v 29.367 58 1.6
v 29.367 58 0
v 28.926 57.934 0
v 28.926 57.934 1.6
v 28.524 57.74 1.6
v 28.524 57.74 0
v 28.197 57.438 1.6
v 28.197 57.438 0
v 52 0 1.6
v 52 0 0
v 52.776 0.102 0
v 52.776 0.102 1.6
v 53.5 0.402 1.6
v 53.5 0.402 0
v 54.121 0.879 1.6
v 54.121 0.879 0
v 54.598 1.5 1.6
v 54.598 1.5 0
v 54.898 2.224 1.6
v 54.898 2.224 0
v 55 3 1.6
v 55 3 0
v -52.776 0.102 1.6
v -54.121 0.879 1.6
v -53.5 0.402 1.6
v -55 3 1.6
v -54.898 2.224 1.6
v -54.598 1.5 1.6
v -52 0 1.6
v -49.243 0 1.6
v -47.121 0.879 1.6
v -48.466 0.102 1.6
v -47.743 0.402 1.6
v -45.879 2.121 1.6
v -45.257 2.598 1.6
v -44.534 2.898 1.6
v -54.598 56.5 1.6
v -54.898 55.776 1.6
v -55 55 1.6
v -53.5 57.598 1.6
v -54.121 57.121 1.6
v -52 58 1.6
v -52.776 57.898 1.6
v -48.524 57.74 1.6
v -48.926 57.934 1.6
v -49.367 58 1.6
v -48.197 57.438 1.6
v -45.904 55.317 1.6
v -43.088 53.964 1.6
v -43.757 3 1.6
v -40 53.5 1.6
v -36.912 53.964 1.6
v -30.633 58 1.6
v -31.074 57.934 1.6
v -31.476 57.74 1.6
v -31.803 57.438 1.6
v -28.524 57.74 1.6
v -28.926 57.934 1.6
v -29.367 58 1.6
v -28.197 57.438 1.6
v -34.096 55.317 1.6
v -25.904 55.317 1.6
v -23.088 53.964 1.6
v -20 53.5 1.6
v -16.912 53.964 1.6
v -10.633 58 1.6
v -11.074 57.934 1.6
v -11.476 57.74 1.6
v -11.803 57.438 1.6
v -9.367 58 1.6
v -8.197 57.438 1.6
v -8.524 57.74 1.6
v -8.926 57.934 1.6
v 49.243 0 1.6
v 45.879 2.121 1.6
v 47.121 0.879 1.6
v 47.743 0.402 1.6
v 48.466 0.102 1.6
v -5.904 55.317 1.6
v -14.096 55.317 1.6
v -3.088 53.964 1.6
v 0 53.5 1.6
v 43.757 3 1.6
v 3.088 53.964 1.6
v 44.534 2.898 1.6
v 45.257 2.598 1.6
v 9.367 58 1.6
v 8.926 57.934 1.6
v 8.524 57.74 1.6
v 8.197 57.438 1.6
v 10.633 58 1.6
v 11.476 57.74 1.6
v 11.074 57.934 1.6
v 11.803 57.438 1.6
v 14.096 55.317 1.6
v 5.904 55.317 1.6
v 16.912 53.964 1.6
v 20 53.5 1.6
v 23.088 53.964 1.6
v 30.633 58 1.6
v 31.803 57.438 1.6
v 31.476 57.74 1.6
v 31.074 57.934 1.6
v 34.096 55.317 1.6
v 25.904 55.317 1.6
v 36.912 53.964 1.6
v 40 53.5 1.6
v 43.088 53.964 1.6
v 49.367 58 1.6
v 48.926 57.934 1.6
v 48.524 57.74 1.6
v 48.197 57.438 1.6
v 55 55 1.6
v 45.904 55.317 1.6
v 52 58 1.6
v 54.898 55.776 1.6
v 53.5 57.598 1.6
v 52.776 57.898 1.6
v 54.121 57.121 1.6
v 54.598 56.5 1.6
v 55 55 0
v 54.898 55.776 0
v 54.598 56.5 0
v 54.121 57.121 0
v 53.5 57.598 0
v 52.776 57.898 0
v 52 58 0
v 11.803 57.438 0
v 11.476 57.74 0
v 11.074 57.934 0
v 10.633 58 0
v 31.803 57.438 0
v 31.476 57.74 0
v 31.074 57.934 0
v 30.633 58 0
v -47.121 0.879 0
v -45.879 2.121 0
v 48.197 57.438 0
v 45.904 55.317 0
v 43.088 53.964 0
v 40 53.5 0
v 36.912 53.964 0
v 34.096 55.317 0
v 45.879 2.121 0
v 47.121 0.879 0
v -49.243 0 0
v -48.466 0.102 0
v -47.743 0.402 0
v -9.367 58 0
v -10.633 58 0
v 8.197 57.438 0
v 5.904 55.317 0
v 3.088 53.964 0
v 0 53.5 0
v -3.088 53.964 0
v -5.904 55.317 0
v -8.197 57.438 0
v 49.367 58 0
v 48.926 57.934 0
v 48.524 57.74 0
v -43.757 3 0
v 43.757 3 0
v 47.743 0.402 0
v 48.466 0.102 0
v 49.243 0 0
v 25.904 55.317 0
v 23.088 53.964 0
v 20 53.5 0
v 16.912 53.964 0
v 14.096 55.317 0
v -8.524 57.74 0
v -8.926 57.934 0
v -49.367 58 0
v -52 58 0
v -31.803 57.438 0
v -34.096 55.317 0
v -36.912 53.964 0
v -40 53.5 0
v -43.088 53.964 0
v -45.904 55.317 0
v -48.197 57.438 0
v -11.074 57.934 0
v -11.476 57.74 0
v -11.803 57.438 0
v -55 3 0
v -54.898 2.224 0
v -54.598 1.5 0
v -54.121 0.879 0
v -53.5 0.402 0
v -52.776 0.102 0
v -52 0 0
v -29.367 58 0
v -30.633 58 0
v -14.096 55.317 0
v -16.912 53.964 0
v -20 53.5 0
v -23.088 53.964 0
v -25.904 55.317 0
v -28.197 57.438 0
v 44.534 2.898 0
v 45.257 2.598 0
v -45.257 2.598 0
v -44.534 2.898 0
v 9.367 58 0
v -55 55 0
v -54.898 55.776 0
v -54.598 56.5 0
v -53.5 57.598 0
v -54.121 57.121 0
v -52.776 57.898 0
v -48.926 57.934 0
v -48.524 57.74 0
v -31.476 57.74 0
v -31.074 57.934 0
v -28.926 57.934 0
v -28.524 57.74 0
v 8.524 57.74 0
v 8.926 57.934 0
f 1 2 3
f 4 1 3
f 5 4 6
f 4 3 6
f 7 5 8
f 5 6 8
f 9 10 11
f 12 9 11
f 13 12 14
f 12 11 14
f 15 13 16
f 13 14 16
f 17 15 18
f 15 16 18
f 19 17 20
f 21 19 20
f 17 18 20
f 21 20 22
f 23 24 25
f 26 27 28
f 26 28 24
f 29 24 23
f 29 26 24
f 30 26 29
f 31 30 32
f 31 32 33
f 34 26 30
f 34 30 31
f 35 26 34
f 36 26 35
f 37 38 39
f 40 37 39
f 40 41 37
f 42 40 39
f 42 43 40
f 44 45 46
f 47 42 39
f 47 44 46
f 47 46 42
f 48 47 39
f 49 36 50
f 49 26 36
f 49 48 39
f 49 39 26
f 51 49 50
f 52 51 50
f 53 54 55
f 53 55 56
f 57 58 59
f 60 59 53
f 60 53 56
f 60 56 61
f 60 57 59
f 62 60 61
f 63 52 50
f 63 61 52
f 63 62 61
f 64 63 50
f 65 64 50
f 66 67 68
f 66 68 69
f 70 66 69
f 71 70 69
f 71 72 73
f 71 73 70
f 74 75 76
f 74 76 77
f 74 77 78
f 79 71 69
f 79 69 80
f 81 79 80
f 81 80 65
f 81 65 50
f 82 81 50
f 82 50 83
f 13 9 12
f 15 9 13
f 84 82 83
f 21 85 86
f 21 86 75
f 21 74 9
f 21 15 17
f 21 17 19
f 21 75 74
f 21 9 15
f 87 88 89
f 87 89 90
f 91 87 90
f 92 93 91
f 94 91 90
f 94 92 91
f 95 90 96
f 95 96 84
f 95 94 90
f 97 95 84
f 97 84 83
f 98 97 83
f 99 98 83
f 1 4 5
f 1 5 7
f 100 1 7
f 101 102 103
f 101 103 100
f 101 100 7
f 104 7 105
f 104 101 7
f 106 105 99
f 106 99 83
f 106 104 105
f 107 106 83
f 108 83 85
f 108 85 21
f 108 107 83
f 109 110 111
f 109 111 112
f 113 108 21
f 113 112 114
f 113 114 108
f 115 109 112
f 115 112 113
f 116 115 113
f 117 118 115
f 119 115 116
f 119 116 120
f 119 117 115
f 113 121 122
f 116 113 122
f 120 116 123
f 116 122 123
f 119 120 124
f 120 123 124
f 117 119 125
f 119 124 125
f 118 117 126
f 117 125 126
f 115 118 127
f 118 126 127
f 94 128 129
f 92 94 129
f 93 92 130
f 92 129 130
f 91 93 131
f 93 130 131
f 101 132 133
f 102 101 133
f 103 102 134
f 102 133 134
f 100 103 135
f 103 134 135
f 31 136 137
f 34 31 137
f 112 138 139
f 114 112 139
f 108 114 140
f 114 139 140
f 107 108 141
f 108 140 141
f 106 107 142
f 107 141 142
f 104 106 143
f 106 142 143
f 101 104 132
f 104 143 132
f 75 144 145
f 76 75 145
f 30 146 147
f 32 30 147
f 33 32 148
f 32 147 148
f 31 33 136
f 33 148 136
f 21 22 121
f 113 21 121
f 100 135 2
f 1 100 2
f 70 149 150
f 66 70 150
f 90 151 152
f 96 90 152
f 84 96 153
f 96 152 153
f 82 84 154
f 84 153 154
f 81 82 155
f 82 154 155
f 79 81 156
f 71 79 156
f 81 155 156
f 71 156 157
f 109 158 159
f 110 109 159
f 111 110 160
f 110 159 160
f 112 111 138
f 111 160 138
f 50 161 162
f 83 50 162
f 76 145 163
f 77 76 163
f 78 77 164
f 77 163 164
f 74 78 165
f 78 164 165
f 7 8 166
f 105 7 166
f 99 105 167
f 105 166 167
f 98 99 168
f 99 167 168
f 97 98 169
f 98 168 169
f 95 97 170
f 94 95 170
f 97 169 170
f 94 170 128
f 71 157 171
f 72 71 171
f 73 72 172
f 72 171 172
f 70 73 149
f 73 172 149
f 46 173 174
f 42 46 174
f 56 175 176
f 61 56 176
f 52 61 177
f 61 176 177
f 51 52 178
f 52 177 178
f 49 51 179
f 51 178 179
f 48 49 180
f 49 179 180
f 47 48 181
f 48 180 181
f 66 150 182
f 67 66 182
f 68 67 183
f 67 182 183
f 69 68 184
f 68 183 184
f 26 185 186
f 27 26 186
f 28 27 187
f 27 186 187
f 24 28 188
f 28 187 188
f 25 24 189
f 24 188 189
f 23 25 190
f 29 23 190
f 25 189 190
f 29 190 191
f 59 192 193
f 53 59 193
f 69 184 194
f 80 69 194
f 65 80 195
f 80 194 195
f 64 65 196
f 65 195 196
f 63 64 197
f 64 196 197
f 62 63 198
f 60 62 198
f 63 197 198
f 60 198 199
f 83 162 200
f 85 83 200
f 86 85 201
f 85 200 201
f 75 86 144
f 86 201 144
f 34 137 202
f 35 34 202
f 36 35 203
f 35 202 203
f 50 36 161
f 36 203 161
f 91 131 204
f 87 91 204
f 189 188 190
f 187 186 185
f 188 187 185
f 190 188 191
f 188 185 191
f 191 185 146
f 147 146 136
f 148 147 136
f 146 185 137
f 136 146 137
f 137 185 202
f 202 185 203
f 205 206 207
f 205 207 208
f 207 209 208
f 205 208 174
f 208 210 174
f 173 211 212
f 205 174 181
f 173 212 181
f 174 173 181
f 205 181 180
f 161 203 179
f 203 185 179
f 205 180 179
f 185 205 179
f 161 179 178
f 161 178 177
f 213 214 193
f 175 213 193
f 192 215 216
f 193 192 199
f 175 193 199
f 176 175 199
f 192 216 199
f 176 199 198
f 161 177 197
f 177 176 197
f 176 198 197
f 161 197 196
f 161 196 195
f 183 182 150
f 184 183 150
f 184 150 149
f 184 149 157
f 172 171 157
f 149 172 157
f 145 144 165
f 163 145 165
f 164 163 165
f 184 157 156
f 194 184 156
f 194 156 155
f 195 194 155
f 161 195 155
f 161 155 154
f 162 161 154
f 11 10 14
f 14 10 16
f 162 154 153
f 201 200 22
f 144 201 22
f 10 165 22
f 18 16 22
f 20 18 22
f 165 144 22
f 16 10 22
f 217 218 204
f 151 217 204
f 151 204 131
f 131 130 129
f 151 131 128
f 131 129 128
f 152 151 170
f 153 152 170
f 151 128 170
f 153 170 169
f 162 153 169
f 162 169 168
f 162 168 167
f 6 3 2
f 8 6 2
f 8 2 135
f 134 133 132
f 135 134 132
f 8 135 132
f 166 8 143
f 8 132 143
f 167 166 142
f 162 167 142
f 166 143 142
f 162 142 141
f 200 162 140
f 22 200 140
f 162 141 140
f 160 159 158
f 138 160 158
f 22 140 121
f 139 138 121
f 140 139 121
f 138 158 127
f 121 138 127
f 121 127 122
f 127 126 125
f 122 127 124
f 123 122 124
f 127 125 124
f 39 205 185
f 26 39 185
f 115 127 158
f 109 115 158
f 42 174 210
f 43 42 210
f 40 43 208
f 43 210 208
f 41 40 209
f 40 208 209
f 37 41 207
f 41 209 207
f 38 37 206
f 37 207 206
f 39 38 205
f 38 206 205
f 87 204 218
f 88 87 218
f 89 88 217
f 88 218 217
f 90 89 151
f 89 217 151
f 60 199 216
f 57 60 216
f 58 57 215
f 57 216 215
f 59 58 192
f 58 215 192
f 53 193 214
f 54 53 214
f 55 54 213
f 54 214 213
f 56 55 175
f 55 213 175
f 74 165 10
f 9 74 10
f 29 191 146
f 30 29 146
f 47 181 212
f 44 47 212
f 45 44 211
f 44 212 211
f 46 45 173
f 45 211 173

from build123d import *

# Parameters (mm, degrees)
BOSS_EXTRUDE1_DEPTH = 1.6


with BuildPart() as part:
    # Sketch2 → Boss-Extrude1 (new body)
    with BuildSketch(Plane.XY):
        with BuildLine():
            Line((-47.121320344, 0.878679656), (-45.878679656, 2.121320344))
            ThreePointArc((-45.878679656, 2.121320344), (-44.90540961, 2.771638598), (-43.757359313, 3))
            Line((-43.757359313, 3), (43.757359313, 3))
            ThreePointArc((43.757359313, 3), (44.90540961, 2.771638598), (45.878679656, 2.121320344))
            Line((45.878679656, 2.121320344), (47.121320344, 0.878679656))
            ThreePointArc((47.121320344, 0.878679656), (48.09459039, 0.228361402), (49.242640687, 0))
            Line((49.242640687, 0), (52, 0))
            ThreePointArc((52, 0), (54.121320344, 0.878679656), (55, 3))
            Line((55, 3), (55, 55))
            ThreePointArc((55, 55), (54.121320344, 57.121320344), (52, 58))
            Line((52, 58), (49.367496998, 58))
            ThreePointArc((49.367496998, 58), (48.717977945, 57.852081728), (48.196559873, 57.4375))
            ThreePointArc((48.196559873, 57.4375), (40, 53.5), (31.803440127, 57.4375))
            ThreePointArc((31.803440127, 57.4375), (31.282022055, 57.852081728), (30.632503002, 58))
            Line((30.632503002, 58), (29.367496998, 58))
            ThreePointArc((29.367496998, 58), (28.717977945, 57.852081728), (28.196559873, 57.4375))
            ThreePointArc((28.196559873, 57.4375), (20, 53.5), (11.803440127, 57.4375))
            ThreePointArc((11.803440127, 57.4375), (11.282022055, 57.852081728), (10.632503002, 58))
            Line((10.632503002, 58), (9.367496998, 58))
            ThreePointArc((9.367496998, 58), (8.717977945, 57.852081728), (8.196559873, 57.4375))
            ThreePointArc((8.196559873, 57.4375), (0, 53.5), (-8.196559873, 57.4375))
            ThreePointArc((-8.196559873, 57.4375), (-8.717977945, 57.852081728), (-9.367496998, 58))
            Line((-9.367496998, 58), (-10.632503002, 58))
            ThreePointArc((-10.632503002, 58), (-11.282022055, 57.852081728), (-11.803440127, 57.4375))
            ThreePointArc((-11.803440127, 57.4375), (-20, 53.5), (-28.196559873, 57.4375))
            ThreePointArc((-28.196559873, 57.4375), (-28.717977945, 57.852081728), (-29.367496998, 58))
            Line((-29.367496998, 58), (-30.632503002, 58))
            ThreePointArc((-30.632503002, 58), (-31.282022055, 57.852081728), (-31.803440127, 57.4375))
            ThreePointArc((-31.803440127, 57.4375), (-40, 53.5), (-48.196559873, 57.4375))
            ThreePointArc((-48.196559873, 57.4375), (-48.717977945, 57.852081728), (-49.367496998, 58))
            Line((-49.367496998, 58), (-52, 58))
            ThreePointArc((-52, 58), (-54.121320344, 57.121320344), (-55, 55))
            Line((-55, 55), (-55, 3))
            ThreePointArc((-55, 3), (-54.121320344, 0.878679656), (-52, 0))
            Line((-52, 0), (-49.242640687, 0))
            ThreePointArc((-49.242640687, 0), (-48.09459039, 0.228361402), (-47.121320344, 0.878679656))
        make_face()
    extrude(amount=BOSS_EXTRUDE1_DEPTH)


solid = part.part
